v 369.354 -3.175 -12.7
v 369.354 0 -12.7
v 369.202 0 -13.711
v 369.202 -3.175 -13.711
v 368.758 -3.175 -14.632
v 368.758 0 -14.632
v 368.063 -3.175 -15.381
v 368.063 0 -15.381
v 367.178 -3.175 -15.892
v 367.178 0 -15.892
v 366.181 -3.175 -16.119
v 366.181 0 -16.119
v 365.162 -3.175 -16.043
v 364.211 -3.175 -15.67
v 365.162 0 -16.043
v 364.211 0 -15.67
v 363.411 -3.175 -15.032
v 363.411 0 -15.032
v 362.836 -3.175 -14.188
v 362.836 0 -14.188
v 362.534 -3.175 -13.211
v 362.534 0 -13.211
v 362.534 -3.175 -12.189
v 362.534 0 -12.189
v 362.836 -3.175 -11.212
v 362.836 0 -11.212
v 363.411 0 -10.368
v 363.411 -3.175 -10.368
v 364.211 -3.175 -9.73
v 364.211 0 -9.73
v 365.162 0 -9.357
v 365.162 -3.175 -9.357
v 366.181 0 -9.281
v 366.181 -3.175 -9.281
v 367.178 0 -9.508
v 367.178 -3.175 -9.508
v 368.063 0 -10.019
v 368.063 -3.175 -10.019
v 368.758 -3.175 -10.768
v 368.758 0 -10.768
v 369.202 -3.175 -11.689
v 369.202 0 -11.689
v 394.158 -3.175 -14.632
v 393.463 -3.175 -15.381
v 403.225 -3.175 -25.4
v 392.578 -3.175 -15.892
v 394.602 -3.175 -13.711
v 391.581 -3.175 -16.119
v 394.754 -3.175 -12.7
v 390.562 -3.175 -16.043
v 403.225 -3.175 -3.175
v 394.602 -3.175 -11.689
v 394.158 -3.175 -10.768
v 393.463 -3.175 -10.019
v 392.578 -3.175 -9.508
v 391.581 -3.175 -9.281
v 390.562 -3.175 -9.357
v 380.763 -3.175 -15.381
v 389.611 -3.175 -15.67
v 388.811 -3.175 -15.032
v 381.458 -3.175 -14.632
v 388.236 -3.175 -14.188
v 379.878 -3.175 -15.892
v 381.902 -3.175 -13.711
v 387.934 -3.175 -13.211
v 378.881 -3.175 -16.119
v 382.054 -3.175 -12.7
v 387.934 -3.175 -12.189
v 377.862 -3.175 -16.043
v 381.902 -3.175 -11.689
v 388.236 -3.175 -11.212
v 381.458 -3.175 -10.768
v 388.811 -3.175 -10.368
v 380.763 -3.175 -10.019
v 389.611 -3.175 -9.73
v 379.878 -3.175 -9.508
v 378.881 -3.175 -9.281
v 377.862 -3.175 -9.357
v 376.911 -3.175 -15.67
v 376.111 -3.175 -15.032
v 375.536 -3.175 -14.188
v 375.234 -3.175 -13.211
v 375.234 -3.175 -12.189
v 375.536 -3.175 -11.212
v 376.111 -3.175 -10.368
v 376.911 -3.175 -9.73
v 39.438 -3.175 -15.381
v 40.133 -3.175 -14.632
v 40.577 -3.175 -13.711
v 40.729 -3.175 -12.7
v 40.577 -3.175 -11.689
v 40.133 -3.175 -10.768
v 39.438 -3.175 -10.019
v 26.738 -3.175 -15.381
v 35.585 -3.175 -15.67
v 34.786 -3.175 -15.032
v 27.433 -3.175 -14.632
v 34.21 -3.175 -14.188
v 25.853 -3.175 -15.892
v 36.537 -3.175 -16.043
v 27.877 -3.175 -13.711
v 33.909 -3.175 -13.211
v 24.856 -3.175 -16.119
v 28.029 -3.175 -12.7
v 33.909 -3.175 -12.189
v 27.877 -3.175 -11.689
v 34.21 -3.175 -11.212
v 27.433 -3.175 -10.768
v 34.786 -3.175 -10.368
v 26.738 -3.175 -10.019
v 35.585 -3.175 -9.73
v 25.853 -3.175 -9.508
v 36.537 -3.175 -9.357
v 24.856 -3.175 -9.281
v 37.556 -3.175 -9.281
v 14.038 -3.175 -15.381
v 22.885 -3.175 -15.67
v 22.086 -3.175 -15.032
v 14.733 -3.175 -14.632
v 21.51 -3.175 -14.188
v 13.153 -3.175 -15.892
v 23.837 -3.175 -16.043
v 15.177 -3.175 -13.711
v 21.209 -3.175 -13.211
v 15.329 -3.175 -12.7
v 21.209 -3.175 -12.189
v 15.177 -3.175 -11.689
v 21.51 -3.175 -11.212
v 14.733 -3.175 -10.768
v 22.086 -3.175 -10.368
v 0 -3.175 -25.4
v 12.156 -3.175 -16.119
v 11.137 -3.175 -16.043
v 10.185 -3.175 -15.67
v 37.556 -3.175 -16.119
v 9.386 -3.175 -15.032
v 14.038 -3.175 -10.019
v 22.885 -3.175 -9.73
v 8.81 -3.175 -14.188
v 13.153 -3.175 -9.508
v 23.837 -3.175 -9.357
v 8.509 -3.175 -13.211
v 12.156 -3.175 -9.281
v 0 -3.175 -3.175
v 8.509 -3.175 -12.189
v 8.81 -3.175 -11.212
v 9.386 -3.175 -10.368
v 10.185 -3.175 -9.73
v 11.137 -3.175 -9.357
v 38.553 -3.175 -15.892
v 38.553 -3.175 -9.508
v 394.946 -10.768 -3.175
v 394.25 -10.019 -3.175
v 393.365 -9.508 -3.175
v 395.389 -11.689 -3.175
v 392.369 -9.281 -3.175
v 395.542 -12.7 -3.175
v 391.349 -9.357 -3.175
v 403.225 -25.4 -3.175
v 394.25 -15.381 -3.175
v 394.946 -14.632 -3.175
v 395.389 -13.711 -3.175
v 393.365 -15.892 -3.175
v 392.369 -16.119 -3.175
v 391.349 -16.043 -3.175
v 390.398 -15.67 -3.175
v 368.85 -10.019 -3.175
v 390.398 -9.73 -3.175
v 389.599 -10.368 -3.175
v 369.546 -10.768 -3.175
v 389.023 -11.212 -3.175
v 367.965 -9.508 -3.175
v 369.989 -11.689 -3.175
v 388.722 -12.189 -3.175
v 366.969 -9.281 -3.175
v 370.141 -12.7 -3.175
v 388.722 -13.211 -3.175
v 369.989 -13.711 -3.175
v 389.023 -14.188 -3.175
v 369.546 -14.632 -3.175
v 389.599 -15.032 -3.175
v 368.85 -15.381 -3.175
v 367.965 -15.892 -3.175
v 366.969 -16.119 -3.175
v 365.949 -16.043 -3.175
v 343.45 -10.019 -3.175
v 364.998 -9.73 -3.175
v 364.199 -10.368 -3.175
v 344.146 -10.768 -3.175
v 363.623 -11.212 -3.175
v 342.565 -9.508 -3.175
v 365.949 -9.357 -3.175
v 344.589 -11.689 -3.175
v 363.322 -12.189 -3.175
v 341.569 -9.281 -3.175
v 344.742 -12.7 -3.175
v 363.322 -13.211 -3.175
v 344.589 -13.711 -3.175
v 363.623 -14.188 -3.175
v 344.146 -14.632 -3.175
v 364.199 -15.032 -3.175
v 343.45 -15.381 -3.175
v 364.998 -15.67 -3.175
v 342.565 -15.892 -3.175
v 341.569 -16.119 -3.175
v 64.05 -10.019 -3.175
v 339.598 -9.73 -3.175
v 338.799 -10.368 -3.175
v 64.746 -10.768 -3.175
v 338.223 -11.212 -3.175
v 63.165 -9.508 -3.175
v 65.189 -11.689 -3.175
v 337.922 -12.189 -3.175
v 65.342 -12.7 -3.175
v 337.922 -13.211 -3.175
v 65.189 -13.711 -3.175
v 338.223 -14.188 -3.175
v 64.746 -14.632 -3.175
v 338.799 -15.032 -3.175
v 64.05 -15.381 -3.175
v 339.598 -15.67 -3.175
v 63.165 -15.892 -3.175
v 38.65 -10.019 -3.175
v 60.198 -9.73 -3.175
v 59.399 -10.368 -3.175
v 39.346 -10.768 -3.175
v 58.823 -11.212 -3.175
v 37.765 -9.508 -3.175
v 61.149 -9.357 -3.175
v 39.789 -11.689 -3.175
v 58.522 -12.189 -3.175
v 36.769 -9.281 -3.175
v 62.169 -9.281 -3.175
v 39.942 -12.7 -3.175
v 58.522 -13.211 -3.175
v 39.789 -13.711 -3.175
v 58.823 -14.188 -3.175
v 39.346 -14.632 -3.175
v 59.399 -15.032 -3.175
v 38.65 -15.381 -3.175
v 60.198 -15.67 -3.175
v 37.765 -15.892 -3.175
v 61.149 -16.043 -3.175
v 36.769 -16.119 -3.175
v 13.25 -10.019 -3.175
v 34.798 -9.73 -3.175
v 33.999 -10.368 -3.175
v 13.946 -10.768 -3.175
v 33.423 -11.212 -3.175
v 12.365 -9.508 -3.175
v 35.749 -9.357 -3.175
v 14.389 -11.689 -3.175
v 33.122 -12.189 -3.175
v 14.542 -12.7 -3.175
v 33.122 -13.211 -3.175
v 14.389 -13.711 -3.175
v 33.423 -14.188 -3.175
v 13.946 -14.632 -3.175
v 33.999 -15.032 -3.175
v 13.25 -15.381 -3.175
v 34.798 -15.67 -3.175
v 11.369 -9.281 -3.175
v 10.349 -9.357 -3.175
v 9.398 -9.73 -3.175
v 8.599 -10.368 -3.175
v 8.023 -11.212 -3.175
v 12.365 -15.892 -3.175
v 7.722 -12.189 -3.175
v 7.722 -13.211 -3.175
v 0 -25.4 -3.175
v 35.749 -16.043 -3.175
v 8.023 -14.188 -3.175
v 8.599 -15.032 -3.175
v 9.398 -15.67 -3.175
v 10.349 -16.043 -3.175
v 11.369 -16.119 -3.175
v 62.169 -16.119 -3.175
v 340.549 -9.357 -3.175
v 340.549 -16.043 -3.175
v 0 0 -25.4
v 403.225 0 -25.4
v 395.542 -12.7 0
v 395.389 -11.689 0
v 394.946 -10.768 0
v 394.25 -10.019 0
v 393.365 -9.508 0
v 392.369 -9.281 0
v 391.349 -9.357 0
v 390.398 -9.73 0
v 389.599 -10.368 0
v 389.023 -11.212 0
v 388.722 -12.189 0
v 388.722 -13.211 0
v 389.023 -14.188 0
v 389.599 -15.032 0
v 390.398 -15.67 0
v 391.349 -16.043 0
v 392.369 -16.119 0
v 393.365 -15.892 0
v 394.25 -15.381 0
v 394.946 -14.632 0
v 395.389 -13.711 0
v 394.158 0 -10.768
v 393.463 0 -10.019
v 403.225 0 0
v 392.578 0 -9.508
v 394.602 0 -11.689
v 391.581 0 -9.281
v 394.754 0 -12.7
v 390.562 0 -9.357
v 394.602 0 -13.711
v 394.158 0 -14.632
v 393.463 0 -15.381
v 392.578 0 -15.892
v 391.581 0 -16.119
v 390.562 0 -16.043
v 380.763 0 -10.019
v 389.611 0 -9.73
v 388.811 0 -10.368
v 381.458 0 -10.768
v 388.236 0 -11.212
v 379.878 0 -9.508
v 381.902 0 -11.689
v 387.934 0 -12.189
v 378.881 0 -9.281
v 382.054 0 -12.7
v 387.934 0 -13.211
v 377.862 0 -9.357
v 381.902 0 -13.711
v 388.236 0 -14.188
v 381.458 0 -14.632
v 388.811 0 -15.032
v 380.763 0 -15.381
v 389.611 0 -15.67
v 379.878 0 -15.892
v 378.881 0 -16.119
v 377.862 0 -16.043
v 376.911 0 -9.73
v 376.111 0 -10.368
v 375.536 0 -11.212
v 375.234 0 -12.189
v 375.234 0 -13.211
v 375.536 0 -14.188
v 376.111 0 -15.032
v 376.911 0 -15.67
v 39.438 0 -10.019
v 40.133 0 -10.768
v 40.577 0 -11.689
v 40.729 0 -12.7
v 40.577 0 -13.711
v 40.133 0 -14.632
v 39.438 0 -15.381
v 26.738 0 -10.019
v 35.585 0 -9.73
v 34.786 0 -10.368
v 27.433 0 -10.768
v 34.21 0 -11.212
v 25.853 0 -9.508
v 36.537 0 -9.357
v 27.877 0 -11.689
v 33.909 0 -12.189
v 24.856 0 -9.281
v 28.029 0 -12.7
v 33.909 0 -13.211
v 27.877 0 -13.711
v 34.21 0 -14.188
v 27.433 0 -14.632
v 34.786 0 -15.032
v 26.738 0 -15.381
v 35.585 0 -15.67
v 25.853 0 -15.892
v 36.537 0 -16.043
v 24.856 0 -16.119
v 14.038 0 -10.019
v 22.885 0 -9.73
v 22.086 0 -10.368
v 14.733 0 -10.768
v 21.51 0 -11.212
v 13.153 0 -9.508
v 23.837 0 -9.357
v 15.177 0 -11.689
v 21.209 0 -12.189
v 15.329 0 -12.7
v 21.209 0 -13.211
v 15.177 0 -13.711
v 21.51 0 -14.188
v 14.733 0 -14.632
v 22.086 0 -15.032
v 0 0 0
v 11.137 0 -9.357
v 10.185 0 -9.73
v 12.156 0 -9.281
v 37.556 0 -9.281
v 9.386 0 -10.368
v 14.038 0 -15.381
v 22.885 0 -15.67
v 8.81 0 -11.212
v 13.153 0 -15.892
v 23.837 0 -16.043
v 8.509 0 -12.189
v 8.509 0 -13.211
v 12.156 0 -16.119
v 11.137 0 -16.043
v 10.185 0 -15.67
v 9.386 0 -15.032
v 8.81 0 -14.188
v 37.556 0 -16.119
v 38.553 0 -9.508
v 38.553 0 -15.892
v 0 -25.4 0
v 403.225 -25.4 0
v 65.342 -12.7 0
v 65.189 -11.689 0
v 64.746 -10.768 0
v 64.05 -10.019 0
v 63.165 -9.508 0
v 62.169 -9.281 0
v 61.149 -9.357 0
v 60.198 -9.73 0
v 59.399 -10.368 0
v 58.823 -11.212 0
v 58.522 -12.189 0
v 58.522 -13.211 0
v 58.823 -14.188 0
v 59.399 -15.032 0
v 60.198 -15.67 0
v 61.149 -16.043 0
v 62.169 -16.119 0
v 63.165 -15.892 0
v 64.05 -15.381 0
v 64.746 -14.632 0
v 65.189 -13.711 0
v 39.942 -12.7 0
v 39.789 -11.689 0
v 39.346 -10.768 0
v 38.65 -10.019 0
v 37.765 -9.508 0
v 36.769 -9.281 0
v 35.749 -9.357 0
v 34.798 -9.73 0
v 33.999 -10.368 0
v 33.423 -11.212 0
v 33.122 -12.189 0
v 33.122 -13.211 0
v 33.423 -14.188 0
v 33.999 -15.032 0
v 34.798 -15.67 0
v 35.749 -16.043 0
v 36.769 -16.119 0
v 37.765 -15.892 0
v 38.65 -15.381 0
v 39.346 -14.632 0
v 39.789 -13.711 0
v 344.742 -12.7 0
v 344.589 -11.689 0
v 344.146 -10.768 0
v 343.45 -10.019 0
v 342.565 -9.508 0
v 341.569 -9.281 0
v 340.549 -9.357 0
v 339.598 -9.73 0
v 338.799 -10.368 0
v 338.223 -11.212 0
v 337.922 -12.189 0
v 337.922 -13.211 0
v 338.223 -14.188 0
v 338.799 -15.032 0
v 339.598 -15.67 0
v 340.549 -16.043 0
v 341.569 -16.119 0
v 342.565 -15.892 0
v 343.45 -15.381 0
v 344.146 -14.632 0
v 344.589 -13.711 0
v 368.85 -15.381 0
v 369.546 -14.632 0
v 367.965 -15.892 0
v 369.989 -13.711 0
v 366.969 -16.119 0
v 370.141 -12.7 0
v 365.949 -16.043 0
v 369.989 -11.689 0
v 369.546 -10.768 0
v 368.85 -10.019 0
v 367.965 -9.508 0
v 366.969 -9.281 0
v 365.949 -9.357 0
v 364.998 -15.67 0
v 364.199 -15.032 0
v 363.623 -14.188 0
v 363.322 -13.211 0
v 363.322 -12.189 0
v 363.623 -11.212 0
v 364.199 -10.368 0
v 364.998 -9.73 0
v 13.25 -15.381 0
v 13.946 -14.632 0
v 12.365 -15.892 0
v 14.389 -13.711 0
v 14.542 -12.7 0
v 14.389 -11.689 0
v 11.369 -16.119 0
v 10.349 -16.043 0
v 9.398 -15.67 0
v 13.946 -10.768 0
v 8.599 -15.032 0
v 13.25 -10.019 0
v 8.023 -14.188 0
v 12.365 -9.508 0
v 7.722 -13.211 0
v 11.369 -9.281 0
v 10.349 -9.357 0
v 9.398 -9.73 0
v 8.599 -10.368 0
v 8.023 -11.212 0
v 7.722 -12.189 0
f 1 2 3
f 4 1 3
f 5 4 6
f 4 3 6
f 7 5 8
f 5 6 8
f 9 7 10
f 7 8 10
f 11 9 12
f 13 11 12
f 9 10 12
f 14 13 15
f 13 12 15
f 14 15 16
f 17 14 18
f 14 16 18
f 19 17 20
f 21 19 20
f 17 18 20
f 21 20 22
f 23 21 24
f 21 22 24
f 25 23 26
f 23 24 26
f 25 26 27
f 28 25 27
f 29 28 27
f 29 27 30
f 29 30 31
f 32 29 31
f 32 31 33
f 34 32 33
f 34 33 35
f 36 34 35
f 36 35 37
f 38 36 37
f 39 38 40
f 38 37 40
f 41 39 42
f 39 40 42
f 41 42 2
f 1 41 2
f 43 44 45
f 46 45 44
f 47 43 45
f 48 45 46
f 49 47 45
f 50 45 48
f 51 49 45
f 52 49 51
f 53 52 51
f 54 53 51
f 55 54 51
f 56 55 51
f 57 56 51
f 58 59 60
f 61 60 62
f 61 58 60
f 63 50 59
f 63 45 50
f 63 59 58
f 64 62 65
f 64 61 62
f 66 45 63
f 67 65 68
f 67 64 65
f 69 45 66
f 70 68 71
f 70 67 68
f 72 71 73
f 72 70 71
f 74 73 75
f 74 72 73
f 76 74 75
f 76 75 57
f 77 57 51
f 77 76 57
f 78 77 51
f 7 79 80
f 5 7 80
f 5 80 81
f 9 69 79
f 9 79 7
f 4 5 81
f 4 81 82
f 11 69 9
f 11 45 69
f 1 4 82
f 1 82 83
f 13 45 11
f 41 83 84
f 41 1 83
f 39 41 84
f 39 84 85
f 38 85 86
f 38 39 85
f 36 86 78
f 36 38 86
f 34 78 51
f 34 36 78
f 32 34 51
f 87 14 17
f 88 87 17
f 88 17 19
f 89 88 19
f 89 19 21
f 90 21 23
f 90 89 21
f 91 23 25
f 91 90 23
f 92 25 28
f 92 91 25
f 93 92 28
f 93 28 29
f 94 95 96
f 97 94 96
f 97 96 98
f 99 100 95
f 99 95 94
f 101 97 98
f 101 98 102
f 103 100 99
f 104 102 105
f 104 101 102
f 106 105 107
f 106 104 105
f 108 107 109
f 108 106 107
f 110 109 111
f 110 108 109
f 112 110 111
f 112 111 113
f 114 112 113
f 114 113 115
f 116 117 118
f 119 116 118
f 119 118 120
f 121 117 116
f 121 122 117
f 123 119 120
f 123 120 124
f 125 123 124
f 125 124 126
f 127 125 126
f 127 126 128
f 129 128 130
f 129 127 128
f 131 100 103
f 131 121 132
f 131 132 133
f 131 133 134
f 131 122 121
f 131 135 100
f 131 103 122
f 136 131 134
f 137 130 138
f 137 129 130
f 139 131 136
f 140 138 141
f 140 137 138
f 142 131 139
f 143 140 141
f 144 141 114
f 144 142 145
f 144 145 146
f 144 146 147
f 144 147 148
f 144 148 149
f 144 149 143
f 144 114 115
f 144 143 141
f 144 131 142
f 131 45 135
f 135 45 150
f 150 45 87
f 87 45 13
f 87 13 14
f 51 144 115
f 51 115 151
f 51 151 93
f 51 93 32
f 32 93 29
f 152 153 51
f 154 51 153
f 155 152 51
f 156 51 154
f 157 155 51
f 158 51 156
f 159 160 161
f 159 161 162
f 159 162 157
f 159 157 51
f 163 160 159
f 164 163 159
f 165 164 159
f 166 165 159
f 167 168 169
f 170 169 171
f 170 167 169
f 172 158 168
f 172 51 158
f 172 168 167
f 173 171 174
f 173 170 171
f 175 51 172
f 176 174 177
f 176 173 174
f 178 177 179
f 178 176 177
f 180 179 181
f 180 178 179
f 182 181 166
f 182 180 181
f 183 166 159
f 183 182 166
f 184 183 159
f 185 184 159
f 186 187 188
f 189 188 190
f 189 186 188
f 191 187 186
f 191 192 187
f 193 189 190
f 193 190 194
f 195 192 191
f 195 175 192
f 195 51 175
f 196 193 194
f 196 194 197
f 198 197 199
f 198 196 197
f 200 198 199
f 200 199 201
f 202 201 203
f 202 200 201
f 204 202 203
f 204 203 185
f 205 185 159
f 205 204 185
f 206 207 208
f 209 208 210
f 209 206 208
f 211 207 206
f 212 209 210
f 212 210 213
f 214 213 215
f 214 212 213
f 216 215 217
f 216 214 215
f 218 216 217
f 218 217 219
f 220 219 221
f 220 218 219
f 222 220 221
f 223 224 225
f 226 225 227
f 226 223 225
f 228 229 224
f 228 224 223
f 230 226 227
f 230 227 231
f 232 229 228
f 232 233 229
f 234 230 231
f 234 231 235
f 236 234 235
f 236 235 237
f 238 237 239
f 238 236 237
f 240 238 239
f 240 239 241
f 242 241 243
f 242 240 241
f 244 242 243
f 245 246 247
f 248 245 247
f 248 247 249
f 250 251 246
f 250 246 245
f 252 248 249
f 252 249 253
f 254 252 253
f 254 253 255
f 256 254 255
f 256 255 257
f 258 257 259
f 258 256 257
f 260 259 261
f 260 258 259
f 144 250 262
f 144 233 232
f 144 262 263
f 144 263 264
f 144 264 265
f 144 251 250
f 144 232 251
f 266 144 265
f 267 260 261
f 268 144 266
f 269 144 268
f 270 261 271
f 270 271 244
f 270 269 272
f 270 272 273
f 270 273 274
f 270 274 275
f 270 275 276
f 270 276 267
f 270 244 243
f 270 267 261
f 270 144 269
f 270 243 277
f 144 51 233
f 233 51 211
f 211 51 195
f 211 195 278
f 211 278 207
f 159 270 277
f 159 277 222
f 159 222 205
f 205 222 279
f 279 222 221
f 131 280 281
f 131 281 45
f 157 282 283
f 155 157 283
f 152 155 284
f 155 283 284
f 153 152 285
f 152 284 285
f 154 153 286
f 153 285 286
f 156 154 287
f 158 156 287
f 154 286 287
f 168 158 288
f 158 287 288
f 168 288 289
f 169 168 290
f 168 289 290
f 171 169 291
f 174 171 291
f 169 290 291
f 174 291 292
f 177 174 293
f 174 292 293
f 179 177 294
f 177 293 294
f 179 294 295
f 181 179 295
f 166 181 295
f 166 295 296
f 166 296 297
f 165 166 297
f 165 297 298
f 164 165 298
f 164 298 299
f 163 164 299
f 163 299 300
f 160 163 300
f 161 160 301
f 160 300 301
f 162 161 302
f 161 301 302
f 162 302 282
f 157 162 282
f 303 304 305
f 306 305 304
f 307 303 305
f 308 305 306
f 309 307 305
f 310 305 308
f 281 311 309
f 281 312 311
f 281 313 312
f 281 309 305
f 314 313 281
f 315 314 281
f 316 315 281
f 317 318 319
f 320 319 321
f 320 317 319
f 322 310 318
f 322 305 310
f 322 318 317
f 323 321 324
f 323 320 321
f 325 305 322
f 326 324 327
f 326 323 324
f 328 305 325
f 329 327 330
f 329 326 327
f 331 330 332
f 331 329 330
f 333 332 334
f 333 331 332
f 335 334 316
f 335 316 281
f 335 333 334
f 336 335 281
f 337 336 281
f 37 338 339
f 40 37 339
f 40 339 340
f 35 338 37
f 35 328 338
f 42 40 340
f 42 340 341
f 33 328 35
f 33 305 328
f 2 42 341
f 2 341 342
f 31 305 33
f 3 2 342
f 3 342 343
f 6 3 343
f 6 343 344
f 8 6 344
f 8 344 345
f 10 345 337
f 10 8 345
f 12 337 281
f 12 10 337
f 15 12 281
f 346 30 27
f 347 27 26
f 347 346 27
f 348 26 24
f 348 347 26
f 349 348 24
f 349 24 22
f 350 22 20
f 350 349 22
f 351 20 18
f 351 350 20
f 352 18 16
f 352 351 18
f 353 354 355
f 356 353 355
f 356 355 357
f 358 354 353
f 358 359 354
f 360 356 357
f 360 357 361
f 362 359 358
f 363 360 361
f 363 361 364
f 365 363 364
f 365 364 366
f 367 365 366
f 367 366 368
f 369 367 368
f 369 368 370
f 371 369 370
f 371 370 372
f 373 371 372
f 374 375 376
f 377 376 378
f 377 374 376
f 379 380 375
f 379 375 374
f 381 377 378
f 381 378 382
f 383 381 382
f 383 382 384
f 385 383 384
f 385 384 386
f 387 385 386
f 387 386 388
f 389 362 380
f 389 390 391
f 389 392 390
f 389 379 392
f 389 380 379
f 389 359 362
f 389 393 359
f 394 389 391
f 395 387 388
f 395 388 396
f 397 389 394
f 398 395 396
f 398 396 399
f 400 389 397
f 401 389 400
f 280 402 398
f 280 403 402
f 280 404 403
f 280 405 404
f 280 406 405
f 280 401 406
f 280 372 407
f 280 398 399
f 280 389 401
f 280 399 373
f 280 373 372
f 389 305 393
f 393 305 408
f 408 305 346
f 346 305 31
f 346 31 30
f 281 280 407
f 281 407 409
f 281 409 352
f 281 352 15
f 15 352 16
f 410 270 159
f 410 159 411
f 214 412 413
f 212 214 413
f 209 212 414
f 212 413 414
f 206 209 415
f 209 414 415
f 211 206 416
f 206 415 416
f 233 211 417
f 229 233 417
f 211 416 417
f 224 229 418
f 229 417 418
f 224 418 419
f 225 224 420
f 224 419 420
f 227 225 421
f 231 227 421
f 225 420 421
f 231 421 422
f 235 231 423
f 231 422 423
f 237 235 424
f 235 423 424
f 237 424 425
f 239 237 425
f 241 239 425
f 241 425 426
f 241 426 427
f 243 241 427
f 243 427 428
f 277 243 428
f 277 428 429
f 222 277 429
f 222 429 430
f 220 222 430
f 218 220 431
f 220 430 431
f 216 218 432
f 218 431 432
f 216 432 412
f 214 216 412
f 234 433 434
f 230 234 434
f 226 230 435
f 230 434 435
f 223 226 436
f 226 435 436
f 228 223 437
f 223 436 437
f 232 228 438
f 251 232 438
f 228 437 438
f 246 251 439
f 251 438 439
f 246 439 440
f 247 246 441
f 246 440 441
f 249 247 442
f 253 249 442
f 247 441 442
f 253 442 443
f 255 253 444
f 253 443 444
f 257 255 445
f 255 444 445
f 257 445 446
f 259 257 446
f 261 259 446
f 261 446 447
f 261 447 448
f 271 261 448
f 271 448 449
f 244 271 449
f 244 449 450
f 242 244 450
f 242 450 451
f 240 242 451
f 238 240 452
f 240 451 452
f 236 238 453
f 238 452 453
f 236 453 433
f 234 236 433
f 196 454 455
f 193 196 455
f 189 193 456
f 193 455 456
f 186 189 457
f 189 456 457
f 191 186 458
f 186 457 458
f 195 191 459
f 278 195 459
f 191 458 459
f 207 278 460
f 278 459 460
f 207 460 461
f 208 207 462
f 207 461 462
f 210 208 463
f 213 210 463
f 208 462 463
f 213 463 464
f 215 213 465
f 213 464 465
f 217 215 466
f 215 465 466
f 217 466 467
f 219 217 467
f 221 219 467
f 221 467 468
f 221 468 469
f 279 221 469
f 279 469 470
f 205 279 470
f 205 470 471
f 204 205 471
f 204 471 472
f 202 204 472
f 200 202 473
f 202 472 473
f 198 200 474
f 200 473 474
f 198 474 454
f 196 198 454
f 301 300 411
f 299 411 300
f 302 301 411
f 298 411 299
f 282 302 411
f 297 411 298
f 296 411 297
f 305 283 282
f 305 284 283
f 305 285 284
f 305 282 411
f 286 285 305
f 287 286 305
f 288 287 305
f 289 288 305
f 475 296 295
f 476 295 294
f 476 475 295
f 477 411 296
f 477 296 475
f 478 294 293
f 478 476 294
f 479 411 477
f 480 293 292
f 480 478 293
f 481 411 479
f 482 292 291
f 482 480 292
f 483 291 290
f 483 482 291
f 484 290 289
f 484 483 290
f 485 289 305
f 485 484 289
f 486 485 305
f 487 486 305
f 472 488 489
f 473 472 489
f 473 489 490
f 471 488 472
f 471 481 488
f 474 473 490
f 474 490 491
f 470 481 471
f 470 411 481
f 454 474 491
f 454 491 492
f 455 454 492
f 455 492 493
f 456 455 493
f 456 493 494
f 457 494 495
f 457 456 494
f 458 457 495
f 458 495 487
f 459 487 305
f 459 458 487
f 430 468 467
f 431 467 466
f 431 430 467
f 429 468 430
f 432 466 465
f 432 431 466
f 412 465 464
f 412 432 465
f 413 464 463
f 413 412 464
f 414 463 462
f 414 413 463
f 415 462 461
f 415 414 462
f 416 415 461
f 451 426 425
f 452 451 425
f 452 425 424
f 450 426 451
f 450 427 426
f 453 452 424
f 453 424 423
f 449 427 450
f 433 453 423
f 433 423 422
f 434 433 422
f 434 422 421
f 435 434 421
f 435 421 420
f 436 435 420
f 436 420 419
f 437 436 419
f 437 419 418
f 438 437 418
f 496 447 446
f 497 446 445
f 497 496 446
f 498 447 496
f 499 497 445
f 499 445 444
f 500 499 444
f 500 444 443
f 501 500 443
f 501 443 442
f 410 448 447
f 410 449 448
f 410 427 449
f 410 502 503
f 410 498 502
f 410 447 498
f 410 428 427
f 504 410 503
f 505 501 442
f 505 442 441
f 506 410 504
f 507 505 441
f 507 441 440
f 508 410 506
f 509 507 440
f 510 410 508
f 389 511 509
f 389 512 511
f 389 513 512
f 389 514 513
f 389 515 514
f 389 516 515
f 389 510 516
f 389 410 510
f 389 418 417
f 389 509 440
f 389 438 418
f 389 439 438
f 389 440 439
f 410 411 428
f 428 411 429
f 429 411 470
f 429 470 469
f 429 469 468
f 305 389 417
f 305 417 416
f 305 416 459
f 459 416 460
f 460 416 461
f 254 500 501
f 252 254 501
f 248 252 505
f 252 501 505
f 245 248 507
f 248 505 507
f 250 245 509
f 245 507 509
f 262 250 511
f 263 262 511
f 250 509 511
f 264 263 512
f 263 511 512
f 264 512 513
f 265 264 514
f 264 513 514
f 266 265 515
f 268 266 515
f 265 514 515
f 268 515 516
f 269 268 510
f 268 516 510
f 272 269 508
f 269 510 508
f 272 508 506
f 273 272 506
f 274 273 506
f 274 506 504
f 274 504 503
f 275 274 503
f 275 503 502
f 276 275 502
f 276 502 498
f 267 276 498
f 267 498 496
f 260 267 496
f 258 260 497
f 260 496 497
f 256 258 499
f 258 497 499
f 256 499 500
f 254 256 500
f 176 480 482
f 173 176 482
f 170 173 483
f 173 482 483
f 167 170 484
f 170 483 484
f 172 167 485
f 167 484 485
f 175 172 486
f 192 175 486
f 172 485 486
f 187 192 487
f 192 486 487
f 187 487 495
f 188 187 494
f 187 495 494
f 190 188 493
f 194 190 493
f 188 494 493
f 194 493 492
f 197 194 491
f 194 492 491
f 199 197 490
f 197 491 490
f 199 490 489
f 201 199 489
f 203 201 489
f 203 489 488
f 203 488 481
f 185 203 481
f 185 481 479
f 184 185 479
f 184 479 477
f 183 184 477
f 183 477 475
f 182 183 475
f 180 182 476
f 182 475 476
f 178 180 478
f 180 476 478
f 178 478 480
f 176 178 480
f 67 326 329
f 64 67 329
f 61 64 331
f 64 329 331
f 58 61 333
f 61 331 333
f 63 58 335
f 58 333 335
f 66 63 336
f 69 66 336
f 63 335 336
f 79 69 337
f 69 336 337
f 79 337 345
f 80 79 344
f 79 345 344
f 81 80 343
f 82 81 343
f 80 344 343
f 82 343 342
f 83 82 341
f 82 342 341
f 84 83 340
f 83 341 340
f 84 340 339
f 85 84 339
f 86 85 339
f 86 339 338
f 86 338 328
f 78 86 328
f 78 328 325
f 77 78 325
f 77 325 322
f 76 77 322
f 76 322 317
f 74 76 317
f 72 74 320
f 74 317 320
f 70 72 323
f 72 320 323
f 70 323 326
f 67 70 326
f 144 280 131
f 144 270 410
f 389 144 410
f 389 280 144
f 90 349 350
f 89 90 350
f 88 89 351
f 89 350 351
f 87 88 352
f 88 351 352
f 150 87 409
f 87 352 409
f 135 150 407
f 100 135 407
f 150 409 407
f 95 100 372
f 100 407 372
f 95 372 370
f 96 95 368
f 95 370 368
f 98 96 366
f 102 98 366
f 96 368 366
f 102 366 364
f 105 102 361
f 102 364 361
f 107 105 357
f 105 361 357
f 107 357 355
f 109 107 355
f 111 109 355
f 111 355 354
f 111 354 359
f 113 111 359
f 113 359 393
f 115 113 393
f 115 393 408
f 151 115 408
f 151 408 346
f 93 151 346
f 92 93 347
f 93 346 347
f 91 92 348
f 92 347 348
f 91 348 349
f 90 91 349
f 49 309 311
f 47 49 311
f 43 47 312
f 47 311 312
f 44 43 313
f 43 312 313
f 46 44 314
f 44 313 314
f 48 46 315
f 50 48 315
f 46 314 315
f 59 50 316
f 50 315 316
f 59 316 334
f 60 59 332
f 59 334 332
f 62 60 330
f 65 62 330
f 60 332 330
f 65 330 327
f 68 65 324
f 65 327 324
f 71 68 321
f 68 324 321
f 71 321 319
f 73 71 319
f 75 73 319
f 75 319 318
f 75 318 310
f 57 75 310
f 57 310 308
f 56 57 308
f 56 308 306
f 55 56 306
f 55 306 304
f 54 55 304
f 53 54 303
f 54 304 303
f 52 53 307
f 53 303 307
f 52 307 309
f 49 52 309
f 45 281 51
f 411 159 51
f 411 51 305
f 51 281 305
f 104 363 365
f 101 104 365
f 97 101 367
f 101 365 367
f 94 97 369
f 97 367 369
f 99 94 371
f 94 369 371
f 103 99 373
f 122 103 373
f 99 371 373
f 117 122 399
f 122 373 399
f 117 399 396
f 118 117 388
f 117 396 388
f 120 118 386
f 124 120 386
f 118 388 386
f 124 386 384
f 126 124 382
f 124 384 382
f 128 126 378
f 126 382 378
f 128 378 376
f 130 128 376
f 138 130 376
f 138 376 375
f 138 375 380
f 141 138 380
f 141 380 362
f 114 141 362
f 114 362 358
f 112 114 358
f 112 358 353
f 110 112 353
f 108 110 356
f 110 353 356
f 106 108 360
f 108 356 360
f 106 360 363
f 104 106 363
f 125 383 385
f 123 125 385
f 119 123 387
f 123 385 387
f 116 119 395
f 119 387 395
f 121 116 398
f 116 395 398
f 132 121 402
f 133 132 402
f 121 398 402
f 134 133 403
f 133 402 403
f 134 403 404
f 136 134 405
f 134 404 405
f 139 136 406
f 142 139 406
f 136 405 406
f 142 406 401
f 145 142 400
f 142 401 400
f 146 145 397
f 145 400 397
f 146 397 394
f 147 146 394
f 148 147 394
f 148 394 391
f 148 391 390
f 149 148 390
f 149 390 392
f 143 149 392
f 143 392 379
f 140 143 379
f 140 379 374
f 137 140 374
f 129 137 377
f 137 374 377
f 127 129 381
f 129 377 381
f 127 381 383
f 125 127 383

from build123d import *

# Parameters (mm, degrees)
BOSS_EXTRUDE1_DEPTH = 403.225
SKETCH2_R           = 3.429
CUT_EXTRUDE1_DEPTH  = 3.175
SKETCH3_R           = 3.429
CUT_EXTRUDE2_DEPTH  = 3.175


with BuildPart() as part:
    # Sketch1 → Boss-Extrude1 (new body)
    with BuildSketch(Plane(origin=(0, 0, 0), x_dir=(0, 0, -1), z_dir=(1, 0, 0))):
        Polygon((0, 0), (25.4, 0), (25.4, -3.175), (3.175, -3.175), (3.175, -25.4), (0, -25.4), align=None)
    extrude(amount=BOSS_EXTRUDE1_DEPTH)

    # Sketch2 → Cut-Extrude1 (cut)
    with BuildSketch(Plane.XY):
        with Locations((11.1125, -12.7)):
            Circle(SKETCH2_R)
        with Locations((36.5125, -12.7)):
            Circle(SKETCH2_R)
        with Locations((61.9125, -12.7)):
            Circle(SKETCH2_R)
        with Locations((341.3125, -12.7)):
            Circle(SKETCH2_R)
        with Locations((366.7125, -12.7)):
            Circle(SKETCH2_R)
        with Locations((392.1125, -12.7)):
            Circle(SKETCH2_R)
    extrude(amount=-CUT_EXTRUDE1_DEPTH, mode=Mode.SUBTRACT)

    # Sketch3 → Cut-Extrude2 (cut)
    with BuildSketch(Plane(origin=(0, 0, 0), x_dir=(1, 0, 0), z_dir=(0, 1, 0))):
        with Locations((11.8999, 12.7)):
            Circle(SKETCH3_R)
        with Locations((24.5999, 12.7)):
            Circle(SKETCH3_R)
        with Locations((37.2999, 12.7)):
            Circle(SKETCH3_R)
        with Locations((365.9251, 12.7)):
            Circle(SKETCH3_R)
        with Locations((378.6251, 12.7)):
            Circle(SKETCH3_R)
        with Locations((391.3251, 12.7)):
            Circle(SKETCH3_R)
    extrude(amount=-CUT_EXTRUDE2_DEPTH, mode=Mode.SUBTRACT)


solid = part.part
